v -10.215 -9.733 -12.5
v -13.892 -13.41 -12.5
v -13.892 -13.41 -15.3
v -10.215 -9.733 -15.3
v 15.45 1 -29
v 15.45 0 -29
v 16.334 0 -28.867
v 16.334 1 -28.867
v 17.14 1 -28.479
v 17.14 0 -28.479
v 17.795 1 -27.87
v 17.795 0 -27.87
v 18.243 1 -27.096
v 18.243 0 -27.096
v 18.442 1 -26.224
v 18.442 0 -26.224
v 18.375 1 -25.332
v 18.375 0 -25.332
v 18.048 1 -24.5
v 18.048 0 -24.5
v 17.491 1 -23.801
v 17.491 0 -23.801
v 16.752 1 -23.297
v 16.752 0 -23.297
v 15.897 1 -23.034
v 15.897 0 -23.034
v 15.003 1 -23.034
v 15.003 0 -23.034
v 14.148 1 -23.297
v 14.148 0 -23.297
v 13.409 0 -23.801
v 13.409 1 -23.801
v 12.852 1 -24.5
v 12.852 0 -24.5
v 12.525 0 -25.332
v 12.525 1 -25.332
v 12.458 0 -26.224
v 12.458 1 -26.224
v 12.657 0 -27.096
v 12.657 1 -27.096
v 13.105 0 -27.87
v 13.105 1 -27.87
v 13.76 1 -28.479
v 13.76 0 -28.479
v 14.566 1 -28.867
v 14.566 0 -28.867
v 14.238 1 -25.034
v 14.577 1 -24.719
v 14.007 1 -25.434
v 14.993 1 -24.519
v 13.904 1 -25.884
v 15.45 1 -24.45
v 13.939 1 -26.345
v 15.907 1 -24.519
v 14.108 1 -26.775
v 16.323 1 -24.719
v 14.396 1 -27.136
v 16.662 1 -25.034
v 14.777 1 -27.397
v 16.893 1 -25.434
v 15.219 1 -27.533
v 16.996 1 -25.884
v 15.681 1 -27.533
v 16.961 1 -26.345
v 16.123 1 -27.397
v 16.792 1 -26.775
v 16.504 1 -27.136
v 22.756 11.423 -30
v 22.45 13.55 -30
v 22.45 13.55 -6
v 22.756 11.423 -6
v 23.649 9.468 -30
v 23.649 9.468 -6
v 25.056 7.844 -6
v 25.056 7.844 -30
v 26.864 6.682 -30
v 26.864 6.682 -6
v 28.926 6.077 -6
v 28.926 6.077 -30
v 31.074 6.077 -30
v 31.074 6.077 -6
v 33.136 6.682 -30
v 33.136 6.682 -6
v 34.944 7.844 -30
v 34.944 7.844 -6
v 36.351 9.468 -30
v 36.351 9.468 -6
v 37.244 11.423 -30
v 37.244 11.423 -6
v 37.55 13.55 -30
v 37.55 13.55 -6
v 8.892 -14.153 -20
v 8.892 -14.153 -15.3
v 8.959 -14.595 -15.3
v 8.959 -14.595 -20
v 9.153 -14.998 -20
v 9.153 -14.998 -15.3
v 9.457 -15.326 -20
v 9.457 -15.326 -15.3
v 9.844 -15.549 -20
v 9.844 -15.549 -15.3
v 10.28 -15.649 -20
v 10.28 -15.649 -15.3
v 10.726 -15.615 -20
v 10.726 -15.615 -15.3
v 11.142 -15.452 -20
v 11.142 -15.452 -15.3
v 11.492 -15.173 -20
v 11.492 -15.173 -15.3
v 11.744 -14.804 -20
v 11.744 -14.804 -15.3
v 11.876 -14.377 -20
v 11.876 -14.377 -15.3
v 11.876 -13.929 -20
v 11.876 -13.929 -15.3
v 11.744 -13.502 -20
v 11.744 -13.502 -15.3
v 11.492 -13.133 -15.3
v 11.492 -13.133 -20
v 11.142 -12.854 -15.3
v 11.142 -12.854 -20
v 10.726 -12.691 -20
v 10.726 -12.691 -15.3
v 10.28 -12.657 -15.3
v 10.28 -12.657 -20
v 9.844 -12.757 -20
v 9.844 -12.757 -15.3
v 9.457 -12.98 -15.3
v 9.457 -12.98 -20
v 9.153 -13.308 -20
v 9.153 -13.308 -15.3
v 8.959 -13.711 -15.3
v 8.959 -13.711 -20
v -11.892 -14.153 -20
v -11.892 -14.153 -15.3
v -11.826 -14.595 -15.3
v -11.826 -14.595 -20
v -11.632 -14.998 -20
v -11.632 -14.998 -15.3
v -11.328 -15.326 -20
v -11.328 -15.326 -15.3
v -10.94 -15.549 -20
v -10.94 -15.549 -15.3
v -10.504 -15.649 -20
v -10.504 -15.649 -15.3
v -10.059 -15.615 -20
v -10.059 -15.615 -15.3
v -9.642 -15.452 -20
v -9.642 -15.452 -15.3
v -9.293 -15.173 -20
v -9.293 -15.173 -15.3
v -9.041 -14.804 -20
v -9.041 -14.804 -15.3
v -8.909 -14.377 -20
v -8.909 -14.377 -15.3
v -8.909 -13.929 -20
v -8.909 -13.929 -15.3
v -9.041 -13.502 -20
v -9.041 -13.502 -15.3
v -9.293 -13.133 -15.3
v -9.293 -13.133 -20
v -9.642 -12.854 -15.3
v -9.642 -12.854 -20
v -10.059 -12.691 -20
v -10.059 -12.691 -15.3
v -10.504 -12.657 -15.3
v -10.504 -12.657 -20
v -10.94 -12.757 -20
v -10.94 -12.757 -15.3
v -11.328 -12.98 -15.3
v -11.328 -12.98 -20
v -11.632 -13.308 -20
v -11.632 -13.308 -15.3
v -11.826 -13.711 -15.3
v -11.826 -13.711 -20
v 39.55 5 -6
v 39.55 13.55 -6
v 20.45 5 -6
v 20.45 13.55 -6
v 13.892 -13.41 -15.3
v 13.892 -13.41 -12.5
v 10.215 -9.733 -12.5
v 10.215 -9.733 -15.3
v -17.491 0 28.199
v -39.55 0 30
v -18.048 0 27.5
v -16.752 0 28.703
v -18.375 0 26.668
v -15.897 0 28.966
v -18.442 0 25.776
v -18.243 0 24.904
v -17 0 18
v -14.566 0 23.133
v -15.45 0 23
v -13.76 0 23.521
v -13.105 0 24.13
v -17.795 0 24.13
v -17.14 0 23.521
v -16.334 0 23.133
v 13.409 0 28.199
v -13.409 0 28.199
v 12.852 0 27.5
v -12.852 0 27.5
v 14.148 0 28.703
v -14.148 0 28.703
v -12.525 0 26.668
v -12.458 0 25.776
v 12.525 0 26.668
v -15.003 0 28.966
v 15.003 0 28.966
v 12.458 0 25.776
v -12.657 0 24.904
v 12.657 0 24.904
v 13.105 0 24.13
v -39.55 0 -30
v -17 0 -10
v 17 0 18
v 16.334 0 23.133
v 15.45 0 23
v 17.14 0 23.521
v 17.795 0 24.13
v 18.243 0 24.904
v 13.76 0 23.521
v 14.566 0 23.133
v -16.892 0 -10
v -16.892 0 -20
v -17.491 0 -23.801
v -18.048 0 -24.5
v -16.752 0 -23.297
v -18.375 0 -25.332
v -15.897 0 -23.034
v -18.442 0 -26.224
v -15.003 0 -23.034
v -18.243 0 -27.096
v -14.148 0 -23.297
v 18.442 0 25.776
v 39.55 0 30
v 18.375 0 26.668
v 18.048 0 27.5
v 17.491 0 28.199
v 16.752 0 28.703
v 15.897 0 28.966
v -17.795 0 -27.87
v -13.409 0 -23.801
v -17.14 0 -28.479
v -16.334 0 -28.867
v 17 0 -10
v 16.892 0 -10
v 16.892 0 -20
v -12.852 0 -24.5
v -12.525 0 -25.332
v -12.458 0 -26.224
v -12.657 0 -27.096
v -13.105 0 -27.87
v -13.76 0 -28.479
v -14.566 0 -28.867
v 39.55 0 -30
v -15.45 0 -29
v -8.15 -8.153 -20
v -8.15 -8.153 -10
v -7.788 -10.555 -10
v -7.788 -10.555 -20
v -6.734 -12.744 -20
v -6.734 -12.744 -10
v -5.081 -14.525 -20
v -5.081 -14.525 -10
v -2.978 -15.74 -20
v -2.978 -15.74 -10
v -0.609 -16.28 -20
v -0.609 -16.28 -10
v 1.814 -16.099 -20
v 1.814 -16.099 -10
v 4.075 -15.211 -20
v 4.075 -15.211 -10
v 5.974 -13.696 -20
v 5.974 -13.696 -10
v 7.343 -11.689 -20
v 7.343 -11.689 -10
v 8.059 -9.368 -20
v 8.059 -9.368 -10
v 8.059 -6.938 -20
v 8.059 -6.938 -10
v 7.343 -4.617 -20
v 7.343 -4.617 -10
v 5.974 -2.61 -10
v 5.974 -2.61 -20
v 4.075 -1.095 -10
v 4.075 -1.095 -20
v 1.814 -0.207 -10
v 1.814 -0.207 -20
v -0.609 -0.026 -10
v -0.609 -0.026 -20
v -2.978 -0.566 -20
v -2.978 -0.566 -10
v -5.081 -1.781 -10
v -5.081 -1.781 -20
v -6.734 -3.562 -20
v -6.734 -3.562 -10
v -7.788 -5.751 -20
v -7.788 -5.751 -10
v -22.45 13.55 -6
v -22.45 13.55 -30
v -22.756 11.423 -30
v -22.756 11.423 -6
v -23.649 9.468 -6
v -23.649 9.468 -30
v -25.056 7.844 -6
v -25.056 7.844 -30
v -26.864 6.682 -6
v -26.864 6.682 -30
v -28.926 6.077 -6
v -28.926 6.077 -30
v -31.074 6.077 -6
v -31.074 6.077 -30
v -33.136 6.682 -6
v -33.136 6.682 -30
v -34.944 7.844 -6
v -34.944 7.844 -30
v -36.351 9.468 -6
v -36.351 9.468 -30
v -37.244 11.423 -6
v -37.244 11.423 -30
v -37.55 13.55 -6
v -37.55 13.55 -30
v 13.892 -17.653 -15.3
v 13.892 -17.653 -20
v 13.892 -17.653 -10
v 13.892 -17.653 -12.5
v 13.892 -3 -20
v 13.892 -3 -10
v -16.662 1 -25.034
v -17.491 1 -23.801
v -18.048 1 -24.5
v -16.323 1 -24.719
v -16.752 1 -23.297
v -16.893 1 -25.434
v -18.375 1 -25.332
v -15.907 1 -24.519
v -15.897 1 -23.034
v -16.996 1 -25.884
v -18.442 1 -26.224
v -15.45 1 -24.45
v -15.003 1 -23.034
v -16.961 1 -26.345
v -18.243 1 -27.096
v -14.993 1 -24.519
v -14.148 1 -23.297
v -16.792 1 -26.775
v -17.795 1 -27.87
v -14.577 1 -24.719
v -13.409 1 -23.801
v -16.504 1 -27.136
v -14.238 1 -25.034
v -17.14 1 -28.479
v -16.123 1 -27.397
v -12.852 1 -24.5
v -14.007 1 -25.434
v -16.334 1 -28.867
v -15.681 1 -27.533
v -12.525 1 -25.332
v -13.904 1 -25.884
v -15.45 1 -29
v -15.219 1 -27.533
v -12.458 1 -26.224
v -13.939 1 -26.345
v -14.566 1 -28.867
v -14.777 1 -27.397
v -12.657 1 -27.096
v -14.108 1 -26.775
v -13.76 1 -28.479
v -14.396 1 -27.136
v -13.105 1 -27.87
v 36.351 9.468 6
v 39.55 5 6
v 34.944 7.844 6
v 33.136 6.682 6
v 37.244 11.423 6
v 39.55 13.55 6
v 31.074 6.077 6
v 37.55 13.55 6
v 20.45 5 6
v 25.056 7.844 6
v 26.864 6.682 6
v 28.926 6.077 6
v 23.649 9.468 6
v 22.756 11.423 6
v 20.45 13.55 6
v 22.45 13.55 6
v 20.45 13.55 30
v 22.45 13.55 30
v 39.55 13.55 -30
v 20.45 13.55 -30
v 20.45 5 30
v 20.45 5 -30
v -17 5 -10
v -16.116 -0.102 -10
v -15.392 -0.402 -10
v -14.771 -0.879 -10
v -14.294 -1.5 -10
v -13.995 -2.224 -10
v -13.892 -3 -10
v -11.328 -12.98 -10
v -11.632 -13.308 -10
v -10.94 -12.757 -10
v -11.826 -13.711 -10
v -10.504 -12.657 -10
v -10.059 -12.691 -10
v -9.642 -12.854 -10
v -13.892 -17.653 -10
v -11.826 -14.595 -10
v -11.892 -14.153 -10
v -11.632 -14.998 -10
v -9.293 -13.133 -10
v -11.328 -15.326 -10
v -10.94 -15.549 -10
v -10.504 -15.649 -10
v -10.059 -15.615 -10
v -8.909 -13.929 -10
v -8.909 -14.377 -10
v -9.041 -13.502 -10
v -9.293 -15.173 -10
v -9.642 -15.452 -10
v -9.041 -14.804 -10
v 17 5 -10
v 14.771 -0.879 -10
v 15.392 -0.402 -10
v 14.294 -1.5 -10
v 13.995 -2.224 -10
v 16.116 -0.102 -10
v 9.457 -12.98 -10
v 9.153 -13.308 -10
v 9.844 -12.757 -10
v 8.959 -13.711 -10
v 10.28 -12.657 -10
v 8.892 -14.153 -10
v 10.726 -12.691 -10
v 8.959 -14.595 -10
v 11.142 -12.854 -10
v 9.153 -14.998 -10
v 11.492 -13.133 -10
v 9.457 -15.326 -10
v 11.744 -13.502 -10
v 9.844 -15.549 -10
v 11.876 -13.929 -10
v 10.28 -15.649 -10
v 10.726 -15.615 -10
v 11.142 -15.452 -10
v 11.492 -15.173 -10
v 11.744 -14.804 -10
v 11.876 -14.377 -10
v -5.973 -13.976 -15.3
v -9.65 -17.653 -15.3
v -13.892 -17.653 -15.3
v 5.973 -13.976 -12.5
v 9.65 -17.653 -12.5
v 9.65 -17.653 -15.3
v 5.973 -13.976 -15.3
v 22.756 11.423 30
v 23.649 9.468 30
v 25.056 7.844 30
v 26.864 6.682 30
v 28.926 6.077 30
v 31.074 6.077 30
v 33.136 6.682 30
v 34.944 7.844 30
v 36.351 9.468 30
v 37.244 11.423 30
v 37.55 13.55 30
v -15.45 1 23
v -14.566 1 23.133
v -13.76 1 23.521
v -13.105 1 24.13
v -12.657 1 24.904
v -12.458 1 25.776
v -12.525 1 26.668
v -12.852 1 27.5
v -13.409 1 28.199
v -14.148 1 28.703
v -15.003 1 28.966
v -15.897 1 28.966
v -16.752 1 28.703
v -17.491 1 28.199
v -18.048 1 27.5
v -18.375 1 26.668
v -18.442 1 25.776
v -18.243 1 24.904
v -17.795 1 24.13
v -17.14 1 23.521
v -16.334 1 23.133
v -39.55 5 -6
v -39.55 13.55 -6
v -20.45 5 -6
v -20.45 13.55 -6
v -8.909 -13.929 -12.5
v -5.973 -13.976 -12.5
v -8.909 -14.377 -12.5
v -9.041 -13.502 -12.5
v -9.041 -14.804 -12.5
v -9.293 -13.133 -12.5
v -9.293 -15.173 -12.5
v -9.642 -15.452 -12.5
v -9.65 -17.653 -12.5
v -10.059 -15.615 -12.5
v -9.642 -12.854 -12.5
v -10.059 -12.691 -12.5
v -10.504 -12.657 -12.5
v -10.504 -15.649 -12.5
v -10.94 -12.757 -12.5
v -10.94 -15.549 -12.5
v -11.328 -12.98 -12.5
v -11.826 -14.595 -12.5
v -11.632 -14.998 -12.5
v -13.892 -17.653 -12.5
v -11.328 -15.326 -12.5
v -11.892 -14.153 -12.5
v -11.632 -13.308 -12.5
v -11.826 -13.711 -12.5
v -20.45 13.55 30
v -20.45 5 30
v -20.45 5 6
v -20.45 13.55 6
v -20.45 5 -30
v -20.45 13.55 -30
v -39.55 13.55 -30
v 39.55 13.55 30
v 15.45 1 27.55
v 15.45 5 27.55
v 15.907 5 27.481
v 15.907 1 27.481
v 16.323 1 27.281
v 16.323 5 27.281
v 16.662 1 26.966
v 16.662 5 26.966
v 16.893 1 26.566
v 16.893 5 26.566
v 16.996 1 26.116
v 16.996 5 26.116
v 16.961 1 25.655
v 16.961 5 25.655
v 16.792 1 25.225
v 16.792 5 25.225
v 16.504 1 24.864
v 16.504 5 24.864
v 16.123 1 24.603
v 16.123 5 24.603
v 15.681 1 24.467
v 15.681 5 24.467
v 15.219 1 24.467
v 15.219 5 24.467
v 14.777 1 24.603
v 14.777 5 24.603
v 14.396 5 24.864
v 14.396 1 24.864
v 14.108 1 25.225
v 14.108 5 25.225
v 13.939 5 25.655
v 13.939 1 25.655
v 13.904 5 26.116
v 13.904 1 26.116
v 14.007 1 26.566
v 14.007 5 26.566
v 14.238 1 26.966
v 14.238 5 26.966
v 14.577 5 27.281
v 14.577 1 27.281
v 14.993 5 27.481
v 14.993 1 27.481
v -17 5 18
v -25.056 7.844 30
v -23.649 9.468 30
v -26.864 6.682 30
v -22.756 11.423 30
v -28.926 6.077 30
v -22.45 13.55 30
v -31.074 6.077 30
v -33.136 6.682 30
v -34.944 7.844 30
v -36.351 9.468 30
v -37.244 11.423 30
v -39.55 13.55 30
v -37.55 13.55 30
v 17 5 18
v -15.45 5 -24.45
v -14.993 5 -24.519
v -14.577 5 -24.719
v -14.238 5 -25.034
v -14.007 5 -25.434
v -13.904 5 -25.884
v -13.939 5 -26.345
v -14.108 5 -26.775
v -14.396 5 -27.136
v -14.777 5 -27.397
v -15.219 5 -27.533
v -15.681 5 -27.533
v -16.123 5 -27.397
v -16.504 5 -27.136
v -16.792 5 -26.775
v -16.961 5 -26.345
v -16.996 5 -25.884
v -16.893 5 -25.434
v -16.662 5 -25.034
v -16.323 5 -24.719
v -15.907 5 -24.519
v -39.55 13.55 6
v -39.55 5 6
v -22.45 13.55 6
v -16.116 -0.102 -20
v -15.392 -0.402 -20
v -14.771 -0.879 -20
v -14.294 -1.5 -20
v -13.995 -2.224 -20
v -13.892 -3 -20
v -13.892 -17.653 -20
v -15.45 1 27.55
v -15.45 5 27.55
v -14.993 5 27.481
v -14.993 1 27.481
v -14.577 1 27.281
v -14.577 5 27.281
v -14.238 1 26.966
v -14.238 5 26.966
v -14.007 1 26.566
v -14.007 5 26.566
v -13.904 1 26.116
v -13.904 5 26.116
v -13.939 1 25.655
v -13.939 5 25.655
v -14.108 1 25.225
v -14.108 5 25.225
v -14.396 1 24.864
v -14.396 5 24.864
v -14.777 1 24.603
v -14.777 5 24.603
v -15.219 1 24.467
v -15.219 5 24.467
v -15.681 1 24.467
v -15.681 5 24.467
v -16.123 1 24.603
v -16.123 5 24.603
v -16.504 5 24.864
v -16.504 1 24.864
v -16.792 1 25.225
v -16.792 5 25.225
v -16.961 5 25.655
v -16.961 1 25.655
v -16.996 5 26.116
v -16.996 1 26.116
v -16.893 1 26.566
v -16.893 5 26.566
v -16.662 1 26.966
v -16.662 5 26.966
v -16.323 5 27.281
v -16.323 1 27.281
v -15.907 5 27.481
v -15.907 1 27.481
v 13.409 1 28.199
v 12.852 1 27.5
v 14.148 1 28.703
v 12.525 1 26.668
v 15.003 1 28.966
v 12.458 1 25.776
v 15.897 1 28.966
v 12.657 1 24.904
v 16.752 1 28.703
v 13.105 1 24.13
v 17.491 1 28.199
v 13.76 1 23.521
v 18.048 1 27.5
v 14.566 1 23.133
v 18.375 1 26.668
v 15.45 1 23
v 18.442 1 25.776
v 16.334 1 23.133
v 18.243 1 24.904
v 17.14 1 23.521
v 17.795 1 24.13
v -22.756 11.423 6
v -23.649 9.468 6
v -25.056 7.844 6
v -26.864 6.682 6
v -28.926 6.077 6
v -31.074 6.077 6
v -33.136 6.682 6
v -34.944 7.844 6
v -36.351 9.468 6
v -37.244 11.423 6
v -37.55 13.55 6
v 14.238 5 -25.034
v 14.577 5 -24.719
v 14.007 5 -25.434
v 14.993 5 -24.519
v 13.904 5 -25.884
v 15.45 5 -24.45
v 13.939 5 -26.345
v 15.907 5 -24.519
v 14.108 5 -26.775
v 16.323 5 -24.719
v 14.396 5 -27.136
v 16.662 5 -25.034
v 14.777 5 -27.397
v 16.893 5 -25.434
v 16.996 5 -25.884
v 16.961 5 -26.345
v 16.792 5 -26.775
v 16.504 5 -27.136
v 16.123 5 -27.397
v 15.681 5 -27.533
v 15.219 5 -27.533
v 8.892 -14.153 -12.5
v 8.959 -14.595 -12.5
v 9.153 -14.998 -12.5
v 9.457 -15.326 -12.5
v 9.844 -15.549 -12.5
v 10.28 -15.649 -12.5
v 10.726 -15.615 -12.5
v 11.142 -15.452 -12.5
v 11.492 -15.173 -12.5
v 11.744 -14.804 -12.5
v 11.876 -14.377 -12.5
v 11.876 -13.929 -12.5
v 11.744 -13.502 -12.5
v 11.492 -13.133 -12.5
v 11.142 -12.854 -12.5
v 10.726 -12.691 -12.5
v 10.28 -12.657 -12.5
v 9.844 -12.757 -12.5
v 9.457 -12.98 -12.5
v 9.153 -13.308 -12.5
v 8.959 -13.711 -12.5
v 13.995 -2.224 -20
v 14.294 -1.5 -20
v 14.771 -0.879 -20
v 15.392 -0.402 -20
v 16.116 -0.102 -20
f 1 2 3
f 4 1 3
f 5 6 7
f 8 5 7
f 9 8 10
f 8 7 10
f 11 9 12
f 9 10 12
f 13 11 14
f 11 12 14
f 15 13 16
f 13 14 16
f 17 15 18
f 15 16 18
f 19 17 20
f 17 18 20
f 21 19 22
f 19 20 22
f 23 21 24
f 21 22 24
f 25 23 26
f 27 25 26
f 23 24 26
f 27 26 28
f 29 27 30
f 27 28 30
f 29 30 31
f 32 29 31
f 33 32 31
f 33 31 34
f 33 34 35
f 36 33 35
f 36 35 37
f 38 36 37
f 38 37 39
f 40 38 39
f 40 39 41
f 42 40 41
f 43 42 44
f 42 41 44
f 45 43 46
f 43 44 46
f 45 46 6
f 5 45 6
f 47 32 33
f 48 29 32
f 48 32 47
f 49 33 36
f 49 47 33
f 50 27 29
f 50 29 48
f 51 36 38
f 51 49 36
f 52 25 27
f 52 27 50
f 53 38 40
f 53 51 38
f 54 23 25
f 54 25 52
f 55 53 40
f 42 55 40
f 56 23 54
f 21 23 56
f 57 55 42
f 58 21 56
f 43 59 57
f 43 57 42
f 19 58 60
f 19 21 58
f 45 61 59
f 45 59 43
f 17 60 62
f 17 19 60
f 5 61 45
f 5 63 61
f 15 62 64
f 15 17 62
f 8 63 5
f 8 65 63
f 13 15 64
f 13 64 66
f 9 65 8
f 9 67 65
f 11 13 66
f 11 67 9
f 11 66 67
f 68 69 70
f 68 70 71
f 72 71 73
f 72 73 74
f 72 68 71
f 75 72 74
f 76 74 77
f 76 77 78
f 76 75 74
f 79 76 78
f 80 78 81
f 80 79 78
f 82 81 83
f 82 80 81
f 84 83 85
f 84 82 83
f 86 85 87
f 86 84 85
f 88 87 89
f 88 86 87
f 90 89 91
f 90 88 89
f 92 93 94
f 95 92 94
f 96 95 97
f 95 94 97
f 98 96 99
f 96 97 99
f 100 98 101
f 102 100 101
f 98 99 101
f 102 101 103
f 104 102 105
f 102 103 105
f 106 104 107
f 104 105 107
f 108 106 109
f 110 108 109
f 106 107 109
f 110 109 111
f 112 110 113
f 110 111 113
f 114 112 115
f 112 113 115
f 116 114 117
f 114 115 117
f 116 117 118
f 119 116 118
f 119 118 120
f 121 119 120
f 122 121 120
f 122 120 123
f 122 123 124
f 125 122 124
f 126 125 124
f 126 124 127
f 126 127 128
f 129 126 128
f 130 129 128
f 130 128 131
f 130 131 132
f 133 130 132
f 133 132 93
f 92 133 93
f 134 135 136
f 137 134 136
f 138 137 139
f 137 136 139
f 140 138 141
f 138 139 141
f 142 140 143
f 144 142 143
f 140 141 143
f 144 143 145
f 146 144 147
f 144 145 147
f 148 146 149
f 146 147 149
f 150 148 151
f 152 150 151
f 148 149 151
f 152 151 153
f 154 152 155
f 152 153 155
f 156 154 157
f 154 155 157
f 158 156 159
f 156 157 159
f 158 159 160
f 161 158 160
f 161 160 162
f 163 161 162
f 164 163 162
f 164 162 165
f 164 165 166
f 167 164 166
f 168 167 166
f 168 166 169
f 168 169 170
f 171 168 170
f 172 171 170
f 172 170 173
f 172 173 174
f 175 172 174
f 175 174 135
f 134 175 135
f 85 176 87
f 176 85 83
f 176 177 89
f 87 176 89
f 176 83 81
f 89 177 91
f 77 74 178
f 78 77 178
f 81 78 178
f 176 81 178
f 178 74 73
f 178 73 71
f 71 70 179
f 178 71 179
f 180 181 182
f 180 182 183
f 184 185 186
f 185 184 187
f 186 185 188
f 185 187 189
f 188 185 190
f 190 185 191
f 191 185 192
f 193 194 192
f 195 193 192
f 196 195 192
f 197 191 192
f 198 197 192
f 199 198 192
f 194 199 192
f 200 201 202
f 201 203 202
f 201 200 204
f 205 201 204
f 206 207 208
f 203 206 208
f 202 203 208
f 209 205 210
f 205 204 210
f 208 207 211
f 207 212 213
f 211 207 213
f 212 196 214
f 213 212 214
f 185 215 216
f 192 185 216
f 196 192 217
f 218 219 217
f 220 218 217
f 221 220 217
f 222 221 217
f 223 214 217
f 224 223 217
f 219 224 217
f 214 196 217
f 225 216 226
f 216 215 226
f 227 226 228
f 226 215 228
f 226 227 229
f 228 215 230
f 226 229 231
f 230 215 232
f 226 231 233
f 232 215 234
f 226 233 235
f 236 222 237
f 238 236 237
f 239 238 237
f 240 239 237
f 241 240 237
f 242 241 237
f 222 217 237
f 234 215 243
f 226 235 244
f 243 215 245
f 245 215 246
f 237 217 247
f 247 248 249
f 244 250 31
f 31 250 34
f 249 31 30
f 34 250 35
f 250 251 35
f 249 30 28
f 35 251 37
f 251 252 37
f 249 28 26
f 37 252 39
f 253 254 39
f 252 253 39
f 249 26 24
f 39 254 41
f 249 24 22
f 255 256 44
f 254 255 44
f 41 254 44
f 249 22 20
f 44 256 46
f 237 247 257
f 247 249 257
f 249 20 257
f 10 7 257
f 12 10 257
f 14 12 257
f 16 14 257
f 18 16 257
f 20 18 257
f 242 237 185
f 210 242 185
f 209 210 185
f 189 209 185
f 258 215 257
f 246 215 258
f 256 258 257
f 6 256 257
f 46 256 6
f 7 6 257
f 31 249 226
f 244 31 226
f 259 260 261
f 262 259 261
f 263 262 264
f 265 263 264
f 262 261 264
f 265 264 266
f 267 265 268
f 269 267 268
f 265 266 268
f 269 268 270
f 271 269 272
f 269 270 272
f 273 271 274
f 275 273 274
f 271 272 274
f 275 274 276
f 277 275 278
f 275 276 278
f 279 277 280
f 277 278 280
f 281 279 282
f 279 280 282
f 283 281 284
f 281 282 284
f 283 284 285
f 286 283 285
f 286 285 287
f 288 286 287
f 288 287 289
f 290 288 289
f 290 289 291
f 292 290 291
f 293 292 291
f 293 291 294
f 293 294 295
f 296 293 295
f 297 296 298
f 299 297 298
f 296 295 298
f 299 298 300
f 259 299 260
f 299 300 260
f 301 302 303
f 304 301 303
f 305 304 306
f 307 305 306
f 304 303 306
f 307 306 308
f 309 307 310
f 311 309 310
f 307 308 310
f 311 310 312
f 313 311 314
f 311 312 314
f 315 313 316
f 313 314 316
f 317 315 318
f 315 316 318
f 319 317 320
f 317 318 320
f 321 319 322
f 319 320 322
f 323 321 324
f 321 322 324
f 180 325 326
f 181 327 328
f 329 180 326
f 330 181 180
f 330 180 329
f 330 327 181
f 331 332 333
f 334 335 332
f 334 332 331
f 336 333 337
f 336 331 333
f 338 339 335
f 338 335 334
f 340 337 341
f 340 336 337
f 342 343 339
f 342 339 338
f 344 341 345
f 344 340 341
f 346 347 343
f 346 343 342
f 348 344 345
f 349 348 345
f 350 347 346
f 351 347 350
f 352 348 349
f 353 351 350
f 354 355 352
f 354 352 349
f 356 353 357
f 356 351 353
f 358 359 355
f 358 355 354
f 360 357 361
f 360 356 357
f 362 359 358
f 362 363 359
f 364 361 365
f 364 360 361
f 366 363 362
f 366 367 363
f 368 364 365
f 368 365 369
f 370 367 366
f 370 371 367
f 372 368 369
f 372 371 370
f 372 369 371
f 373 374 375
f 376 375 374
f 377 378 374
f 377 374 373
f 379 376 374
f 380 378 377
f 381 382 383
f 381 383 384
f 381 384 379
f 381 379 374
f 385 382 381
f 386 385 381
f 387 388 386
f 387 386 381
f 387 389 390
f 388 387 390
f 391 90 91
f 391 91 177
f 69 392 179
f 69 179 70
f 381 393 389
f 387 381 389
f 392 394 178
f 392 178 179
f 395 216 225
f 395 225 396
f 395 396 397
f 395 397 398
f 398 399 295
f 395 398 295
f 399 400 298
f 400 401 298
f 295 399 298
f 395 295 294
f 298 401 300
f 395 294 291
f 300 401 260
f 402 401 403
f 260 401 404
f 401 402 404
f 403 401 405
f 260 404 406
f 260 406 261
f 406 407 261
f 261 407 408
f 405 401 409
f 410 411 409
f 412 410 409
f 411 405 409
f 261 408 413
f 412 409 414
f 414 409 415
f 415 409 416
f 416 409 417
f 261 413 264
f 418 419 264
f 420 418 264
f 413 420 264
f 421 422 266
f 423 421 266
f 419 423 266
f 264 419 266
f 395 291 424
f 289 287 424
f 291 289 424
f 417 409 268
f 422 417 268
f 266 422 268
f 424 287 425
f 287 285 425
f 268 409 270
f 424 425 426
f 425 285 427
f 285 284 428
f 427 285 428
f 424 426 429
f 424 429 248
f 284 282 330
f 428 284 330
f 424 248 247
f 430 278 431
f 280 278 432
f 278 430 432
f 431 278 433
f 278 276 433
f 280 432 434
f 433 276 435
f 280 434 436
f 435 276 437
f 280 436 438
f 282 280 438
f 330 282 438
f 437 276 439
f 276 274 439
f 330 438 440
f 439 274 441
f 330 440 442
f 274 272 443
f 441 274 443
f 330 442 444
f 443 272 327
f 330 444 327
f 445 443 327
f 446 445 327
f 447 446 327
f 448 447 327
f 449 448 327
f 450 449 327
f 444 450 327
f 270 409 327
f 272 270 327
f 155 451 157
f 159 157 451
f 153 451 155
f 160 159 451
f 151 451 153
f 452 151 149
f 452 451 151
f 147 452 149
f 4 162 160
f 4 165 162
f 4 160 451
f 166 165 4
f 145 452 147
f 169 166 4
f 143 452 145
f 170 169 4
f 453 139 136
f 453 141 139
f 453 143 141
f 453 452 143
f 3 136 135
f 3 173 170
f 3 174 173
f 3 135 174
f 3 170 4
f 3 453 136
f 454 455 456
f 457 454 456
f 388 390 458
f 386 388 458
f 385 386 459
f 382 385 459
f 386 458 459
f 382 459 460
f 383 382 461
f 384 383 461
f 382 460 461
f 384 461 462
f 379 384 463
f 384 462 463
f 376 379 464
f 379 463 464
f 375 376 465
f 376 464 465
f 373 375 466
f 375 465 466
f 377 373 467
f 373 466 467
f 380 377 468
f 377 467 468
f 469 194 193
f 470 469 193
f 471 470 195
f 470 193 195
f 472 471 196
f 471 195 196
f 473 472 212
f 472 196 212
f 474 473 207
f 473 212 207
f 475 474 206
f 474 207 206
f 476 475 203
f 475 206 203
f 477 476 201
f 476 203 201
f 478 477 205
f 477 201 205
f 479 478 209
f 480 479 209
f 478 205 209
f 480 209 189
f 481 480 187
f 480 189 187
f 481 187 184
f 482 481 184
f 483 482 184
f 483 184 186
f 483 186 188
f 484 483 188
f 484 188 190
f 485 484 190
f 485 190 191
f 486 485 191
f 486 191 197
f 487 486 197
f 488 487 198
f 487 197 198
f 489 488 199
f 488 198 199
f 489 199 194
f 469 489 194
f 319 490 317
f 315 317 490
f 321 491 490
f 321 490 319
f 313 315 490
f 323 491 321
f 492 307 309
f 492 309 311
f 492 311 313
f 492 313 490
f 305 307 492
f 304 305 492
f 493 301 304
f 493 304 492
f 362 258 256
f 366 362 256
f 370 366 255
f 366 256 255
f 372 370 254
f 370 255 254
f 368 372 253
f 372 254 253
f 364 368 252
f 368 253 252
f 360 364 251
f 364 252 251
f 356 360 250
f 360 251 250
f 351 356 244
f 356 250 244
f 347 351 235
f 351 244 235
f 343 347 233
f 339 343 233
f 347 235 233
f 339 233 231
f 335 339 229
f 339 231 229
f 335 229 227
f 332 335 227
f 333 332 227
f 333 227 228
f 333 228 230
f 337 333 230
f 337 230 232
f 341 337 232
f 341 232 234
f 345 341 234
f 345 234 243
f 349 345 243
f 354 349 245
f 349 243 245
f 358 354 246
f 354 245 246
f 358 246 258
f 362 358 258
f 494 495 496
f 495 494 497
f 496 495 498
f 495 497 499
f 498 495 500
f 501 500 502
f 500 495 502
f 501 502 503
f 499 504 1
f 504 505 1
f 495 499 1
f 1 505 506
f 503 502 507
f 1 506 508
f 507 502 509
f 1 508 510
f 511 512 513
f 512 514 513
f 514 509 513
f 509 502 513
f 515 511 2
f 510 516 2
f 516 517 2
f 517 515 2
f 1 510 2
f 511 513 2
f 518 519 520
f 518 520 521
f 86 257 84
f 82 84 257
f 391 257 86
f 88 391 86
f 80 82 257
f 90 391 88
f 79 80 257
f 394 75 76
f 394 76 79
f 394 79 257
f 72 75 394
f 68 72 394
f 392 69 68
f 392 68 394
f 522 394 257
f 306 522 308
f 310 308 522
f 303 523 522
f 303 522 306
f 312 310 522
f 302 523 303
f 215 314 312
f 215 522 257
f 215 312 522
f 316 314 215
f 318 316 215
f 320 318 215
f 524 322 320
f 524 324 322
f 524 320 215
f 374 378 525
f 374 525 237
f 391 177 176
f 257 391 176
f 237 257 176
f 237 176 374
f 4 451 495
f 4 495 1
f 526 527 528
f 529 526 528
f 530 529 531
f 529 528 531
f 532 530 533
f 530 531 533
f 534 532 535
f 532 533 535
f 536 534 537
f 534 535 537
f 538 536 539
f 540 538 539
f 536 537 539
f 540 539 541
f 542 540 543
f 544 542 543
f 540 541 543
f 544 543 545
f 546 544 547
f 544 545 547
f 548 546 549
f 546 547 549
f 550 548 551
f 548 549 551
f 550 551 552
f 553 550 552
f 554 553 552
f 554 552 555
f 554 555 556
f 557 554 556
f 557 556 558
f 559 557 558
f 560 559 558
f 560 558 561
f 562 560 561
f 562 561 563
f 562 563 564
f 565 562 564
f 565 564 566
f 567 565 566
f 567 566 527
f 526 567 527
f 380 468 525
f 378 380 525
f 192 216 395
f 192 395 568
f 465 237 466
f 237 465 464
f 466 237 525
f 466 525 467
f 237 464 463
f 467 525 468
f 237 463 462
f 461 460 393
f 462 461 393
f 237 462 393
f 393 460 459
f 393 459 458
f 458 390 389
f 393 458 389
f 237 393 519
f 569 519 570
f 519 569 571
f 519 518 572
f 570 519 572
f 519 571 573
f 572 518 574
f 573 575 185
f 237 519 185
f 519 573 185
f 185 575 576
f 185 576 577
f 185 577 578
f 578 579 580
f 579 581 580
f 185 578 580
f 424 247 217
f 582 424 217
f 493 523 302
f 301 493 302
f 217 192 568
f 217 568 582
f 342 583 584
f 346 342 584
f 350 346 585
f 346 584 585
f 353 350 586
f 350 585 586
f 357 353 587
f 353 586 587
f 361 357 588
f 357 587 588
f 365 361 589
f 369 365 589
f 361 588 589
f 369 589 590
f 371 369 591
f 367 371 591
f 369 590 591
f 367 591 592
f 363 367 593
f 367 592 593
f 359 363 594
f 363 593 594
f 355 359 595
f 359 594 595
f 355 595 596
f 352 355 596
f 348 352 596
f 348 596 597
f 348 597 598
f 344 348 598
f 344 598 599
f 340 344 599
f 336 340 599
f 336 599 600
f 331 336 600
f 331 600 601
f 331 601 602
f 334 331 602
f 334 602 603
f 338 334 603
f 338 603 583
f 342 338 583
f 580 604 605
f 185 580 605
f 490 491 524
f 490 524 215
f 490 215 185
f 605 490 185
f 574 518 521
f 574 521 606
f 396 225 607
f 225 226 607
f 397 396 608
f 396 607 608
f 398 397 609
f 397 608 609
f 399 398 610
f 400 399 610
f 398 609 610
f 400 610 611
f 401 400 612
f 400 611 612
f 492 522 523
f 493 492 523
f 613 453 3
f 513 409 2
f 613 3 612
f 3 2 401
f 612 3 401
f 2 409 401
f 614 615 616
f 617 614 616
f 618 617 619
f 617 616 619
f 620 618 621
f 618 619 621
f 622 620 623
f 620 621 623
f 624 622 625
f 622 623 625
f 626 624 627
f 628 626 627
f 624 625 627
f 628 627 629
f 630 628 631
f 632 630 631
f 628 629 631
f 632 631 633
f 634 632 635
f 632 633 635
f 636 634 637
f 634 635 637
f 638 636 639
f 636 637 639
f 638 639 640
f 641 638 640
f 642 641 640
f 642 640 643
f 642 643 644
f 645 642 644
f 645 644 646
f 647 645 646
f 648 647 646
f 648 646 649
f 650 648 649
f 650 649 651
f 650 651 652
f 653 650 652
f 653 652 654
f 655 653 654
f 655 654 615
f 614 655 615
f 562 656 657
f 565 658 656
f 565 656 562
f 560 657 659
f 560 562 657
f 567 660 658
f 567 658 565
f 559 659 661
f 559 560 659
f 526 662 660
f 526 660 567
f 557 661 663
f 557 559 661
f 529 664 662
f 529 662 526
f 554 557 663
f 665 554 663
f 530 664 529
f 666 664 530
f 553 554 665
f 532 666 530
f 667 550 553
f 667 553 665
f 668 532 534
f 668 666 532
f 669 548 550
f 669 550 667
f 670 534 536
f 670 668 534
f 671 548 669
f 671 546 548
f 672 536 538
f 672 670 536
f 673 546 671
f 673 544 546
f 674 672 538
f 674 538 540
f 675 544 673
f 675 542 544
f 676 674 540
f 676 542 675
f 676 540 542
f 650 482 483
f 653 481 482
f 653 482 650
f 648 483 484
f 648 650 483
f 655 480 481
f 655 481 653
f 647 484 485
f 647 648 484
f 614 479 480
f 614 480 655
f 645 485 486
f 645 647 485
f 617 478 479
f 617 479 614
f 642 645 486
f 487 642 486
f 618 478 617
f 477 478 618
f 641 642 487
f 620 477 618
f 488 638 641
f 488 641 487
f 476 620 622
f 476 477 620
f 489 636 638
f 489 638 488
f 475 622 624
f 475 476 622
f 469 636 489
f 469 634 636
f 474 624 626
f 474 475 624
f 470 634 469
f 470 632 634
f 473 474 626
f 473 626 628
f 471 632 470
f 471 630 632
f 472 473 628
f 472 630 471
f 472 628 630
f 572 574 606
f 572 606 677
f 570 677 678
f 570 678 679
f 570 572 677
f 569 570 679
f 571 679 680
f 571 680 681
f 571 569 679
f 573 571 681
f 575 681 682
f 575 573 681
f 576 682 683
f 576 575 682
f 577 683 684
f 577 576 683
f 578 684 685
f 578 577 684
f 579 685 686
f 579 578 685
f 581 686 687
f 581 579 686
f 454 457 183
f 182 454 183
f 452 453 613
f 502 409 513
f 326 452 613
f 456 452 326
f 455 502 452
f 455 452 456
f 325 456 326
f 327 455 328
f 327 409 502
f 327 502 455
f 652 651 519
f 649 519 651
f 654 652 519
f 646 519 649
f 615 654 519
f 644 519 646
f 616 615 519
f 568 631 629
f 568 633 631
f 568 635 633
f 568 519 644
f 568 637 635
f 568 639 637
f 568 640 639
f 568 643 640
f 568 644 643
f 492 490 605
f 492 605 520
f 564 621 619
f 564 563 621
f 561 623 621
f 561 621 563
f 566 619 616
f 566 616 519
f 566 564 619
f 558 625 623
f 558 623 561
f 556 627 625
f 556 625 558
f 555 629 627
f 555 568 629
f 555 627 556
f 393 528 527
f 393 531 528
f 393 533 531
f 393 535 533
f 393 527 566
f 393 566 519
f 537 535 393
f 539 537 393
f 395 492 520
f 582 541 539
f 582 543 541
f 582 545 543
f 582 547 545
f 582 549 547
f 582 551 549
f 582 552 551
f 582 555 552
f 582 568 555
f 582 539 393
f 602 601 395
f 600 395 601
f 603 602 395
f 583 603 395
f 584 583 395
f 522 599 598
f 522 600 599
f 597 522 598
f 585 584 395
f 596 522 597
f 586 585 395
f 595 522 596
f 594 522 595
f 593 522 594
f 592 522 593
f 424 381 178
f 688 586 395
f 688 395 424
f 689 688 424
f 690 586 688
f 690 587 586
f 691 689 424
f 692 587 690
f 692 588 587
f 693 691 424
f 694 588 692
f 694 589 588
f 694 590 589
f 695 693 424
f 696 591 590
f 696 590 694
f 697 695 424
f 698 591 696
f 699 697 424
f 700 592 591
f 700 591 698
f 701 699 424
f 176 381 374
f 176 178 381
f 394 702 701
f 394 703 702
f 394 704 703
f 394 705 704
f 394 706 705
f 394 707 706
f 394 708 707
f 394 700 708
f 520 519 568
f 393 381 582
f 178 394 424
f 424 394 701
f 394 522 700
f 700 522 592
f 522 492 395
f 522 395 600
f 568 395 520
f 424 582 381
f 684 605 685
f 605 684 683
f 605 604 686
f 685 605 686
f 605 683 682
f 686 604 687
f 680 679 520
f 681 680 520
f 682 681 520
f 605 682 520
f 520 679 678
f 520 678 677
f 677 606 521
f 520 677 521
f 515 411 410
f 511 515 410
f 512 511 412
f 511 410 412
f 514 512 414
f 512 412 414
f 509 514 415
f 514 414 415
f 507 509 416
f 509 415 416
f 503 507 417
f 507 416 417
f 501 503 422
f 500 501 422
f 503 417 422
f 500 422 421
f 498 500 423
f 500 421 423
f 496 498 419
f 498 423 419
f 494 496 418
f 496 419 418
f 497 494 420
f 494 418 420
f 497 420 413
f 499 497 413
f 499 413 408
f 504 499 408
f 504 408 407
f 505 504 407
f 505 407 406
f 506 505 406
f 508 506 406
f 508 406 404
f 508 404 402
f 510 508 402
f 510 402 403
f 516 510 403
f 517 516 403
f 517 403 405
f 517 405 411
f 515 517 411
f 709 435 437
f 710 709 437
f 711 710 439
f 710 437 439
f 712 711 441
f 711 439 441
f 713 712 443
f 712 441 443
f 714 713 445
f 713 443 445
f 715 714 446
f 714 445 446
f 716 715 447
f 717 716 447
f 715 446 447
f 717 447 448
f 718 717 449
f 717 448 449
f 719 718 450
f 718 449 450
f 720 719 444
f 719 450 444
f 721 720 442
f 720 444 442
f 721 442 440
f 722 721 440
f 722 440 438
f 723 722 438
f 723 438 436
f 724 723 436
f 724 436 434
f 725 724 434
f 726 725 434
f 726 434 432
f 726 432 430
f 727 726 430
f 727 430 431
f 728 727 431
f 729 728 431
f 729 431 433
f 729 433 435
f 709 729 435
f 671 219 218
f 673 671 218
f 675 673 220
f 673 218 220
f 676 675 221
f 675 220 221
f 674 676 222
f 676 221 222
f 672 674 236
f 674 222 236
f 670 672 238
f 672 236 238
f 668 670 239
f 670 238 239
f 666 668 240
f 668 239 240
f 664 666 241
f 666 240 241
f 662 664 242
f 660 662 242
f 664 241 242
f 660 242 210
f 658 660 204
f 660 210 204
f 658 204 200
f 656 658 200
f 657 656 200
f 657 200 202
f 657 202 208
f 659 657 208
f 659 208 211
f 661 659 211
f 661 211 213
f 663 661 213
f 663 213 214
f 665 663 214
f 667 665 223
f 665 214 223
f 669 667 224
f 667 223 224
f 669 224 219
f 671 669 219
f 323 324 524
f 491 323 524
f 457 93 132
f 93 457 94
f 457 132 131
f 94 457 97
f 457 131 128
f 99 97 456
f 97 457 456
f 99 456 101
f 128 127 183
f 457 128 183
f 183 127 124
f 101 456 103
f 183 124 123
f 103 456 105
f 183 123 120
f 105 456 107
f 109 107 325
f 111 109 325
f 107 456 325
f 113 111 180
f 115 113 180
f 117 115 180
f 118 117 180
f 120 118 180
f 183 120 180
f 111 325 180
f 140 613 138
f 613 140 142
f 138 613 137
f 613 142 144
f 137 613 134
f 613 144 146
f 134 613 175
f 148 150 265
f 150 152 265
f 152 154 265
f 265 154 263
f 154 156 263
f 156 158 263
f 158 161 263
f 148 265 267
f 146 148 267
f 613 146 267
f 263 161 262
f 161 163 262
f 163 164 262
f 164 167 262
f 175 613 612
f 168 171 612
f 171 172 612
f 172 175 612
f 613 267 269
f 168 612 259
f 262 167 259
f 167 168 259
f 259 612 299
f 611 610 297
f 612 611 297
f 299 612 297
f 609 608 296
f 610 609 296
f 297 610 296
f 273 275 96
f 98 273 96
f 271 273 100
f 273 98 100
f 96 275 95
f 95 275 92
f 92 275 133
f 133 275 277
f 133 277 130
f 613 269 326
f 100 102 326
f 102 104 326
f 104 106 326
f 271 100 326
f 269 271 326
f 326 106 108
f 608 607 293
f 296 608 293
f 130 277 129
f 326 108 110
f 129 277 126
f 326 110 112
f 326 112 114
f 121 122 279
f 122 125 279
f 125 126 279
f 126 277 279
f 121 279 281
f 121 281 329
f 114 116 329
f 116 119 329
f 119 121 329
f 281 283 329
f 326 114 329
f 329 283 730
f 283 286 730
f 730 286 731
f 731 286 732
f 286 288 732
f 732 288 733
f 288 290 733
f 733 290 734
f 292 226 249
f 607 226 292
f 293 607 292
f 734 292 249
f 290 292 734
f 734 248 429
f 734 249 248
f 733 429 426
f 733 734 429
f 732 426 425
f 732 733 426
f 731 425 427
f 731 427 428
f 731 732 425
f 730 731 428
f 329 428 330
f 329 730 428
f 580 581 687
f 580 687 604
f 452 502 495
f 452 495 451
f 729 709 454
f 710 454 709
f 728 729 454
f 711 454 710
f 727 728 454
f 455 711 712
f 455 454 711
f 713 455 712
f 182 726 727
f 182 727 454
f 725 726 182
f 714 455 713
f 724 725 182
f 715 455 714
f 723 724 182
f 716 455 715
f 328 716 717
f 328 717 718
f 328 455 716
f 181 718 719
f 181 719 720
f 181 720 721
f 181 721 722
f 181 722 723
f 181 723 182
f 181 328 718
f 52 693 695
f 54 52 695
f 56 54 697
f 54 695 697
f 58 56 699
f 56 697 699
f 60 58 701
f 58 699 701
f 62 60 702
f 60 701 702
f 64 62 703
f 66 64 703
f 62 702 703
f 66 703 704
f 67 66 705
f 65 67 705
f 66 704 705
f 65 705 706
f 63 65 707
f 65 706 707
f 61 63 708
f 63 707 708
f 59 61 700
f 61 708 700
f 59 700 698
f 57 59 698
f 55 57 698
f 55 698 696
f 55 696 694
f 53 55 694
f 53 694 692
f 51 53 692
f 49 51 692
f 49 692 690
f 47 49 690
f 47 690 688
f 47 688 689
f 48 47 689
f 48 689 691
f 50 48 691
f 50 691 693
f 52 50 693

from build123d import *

# Parameters (mm, degrees)
SKETCH1_W            = 79.1
SKETCH1_H            = 60
BOSS_EXTRUDE1_DEPTH  = 5
BOSS_EXTRUDE2_DEPTH  = 24
MIRROR2_COPY_1_DEPTH = 24
SKETCH10_R           = 1.55
CUT_EXTRUDE7_DEPTH   = 8
SKETCH11_R           = 3
CUT_EXTRUDE8_DEPTH   = 1
SKETCH12_W           = 27.78460969
SKETCH12_H           = 17.653
SKETCH12_R           = 1.5
SKETCH12_R_2         = 8.15
BOSS_EXTRUDE5_DEPTH  = 10
SKETCH13_W           = 34
SKETCH13_H           = 28
CUT_EXTRUDE9_DEPTH   = 10
FILLET2_R            = 3
SKETCH15_W           = 6
SKETCH15_H           = 2.8
CUT_EXTRUDE12_DEPTH  = 8.2


with BuildPart() as part:
    # Sketch1 → Boss-Extrude1 (new body)
    with BuildSketch(Plane(origin=(0, 0, 0), x_dir=(1, 0, 0), z_dir=(0, 1, 0))):
        Rectangle(SKETCH1_W, SKETCH1_H)
    extrude(amount=BOSS_EXTRUDE1_DEPTH)

    # Sketch2 → Boss-Extrude2 (add)
    with BuildSketch(Plane.XY.offset(30)):
        with BuildLine():
            Line((-39.55, 13.55), (-39.55, 5))
            Line((-39.55, 5), (-20.45, 5))
            Line((-20.45, 5), (-20.45, 13.55))
            Line((-20.45, 13.55), (-22.45, 13.55))
            ThreePointArc((-22.45, 13.55), (-30, 6), (-37.55, 13.55))
            Line((-37.55, 13.55), (-39.55, 13.55))
        make_face()
    boss_extrude2 = extrude(amount=-BOSS_EXTRUDE2_DEPTH)

    # Mirror1: Boss-Extrude2 across plane
    add(boss_extrude2.mirror(Plane.XY))

    # Mirror2: Boss-Extrude2 across plane
    add(boss_extrude2.mirror(Plane(origin=(0, 0, 0), x_dir=(0, 0, 1), z_dir=(1, 0, 0))))

    # Mirror2 copy 1 sketch → Mirror2 copy 1 (add)
    with BuildSketch(Plane(origin=(0, 0, -30), x_dir=(-1, 0, 0), z_dir=(0, 0, -1))):
        with BuildLine():
            Line((-39.55, 13.55), (-39.55, 5))
            Line((-39.55, 5), (-20.45, 5))
            Line((-20.45, 5), (-20.45, 13.55))
            Line((-20.45, 13.55), (-22.45, 13.55))
            ThreePointArc((-22.45, 13.55), (-30, 6), (-37.55, 13.55))
            Line((-37.55, 13.55), (-39.55, 13.55))
        make_face()
    extrude(amount=-MIRROR2_COPY_1_DEPTH)

    # Sketch10 → Cut-Extrude7 (cut)
    with BuildSketch(Plane(origin=(0, 5, 0), x_dir=(1, 0, 0), z_dir=(0, 1, 0))):
        with Locations(Location((-15.45, -26, 0), (0, 0, 270))):
            Circle(SKETCH10_R)
        with Locations(Location((-15.45, 26, 0), (0, 0, 270))):
            Circle(SKETCH10_R)
        with Locations(Location((15.45, 26, 0), (0, 0, 270))):
            Circle(SKETCH10_R)
        with Locations(Location((15.45, -26, 0), (0, 0, 270))):
            Circle(SKETCH10_R)
    extrude(amount=-CUT_EXTRUDE7_DEPTH, mode=Mode.SUBTRACT)

    # Sketch11 → Cut-Extrude8 (cut)
    with BuildSketch(Plane.XZ):
        with Locations(Location((-15.45, 26, 0), (0, 0, 270))):
            Circle(SKETCH11_R)
        with Locations(Location((15.45, 26, 0), (0, 0, 270))):
            Circle(SKETCH11_R)
        with Locations(Location((15.45, -26, 0), (0, 0, 270))):
            Circle(SKETCH11_R)
        with Locations(Location((-15.45, -26, 0), (0, 0, 270))):
            Circle(SKETCH11_R)
    extrude(amount=-CUT_EXTRUDE8_DEPTH, mode=Mode.SUBTRACT)

    # Sketch12 → Boss-Extrude5 (add)
    with BuildSketch(Plane.XY.offset(-10)):
        with Locations((0, -8.8265)):
            Rectangle(SKETCH12_W, SKETCH12_H)
        with Locations(Location((-10.392304845, -14.153, 0), (0, 0, 180))):
            Circle(SKETCH12_R, mode=Mode.SUBTRACT)
        with Locations(Location((10.392304845, -14.153, 0), (0, 0, 180))):
            Circle(SKETCH12_R, mode=Mode.SUBTRACT)
        with Locations(Location((0, -8.153, 0), (0, 0, 180))):
            Circle(SKETCH12_R_2, mode=Mode.SUBTRACT)
    extrude(amount=-BOSS_EXTRUDE5_DEPTH)

    # Sketch13 → Cut-Extrude9 (cut)
    with BuildSketch(Plane.XZ):
        with Locations((0, 4)):
            Rectangle(SKETCH13_W, SKETCH13_H)
    extrude(amount=-CUT_EXTRUDE9_DEPTH, mode=Mode.SUBTRACT)

    # Fillet2
    fillet2_edges = [part.edges().sort_by_distance(p)[0] for p in [
        (-13.892304845, 0, -15),
        (13.892304845, 0, -15),
    ]]
    fillet(fillet2_edges, radius=FILLET2_R)

    # Sketch15 → Cut-Extrude12 (cut)
    with BuildSketch(Plane(origin=(-15.772652423, -15.772652423, 0), x_dir=(-0.7071067811865477, 0.7071067811865475, 0), z_dir=(-0.7071067811865475, -0.7071067811865477, 0))):
        with Locations((-2.659213046, 13.9)):
            Rectangle(SKETCH15_W, SKETCH15_H)
    cut_extrude12 = extrude(amount=-CUT_EXTRUDE12_DEPTH, mode=Mode.SUBTRACT)

    # Mirror3: Cut-Extrude12 across plane
    add(cut_extrude12.mirror(Plane(origin=(0, 0, 0), x_dir=(0, 0, 1), z_dir=(1, 0, 0))), mode=Mode.SUBTRACT)


solid = part.part
